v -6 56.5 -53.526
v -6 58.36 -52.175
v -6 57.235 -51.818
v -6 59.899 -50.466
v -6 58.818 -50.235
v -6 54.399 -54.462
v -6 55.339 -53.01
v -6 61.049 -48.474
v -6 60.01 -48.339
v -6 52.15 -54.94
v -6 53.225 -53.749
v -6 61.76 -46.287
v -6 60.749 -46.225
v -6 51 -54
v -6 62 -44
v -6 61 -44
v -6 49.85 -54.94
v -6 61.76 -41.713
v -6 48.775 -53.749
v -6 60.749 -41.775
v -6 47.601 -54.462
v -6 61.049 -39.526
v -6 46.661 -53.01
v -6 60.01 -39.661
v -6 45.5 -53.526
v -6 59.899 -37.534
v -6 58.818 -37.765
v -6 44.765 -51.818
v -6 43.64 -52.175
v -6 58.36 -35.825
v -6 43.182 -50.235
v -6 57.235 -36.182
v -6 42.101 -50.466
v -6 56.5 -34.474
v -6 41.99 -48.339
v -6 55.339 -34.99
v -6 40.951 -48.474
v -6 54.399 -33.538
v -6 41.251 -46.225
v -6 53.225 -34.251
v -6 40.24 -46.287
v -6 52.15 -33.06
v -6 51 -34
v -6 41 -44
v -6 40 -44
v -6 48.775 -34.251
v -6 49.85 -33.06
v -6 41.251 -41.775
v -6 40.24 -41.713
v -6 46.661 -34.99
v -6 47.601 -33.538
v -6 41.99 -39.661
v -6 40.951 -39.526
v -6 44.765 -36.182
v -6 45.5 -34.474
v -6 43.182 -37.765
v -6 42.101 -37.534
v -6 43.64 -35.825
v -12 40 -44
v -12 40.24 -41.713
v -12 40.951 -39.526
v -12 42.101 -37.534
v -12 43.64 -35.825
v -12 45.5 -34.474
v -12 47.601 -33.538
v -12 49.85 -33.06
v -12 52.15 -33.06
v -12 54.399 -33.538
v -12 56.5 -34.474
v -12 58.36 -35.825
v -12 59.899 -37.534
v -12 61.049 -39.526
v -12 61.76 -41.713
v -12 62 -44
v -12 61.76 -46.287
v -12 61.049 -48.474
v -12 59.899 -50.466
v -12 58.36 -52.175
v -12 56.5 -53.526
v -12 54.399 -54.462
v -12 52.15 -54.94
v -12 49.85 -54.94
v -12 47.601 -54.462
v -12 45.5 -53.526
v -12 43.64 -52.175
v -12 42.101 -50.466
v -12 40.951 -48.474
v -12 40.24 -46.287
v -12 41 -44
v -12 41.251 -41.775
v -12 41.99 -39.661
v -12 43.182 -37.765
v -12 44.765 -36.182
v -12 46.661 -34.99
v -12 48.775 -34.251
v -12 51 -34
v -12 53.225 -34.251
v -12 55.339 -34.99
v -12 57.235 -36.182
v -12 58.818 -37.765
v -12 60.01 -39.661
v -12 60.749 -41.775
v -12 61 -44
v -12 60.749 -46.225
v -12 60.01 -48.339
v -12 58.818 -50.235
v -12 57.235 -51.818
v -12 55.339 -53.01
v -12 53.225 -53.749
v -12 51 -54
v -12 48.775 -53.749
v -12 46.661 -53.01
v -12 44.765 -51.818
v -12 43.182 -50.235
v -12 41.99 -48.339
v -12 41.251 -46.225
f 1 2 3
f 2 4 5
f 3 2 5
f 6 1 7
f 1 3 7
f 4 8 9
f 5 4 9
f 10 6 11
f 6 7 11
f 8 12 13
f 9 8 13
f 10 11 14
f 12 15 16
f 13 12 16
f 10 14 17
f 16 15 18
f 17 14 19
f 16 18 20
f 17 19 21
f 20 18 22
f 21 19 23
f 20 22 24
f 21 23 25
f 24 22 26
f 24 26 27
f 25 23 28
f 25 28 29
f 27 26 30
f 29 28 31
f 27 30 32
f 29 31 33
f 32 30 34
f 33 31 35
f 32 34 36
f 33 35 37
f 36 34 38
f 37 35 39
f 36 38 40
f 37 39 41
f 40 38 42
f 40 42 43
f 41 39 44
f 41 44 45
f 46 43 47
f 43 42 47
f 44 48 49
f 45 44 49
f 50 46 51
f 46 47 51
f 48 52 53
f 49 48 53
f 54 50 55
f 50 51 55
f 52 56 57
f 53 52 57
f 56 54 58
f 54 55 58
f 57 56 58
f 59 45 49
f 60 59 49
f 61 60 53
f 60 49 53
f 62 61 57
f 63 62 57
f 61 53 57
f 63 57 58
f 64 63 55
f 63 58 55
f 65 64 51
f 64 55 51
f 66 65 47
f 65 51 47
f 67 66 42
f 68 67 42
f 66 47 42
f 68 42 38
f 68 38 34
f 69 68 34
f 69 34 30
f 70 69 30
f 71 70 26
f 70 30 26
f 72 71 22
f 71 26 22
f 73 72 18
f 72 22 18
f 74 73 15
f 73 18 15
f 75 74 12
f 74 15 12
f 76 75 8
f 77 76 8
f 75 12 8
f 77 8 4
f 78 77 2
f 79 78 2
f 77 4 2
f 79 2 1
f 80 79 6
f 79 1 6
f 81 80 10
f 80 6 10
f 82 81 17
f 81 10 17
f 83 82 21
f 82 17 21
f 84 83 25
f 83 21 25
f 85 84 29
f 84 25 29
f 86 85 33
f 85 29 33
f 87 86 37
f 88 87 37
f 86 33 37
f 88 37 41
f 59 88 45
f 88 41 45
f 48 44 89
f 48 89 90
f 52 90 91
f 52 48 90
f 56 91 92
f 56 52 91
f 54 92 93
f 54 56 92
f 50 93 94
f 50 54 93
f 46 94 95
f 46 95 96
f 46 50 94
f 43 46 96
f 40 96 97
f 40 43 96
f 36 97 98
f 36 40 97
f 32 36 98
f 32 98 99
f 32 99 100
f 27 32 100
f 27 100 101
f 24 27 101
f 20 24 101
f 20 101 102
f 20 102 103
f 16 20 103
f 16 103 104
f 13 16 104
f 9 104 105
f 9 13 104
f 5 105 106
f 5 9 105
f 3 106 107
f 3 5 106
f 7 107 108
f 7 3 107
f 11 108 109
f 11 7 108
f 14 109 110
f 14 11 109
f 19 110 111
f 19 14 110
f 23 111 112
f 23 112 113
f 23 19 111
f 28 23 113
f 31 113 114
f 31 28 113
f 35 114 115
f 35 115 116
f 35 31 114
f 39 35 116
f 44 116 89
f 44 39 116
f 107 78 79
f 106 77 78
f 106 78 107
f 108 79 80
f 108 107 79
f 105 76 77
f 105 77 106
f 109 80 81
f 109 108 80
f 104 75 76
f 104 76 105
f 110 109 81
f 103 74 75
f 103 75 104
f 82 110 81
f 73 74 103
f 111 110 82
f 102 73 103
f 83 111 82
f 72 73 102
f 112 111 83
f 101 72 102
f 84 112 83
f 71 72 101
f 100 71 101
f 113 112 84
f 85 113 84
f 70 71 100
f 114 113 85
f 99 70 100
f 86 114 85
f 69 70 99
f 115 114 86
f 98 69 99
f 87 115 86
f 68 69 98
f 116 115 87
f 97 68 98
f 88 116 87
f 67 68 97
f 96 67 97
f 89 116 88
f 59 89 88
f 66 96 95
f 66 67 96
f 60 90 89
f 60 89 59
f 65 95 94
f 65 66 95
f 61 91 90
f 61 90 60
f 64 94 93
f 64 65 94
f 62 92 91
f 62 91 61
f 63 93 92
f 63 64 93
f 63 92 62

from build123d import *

# Parameters (mm, degrees)
SKETCH035_R   = 11
SKETCH035_R_2 = 10
PAD013_DEPTH  = 6


with BuildPart() as bearing_outer_front_left:
    # Sketch035 → Pad013 (new body)
    with BuildSketch(Plane.YZ):
        Circle(SKETCH035_R)
        Circle(SKETCH035_R_2, mode=Mode.SUBTRACT)
    extrude(amount=PAD013_DEPTH)


with BuildPart() as bearing_outer_front_left_1:
    # Body007 placement: moved
    add(bearing_outer_front_left.part.moved(Location((6, -51, -44))))


with BuildPart() as bearing_outer_back_left:
    # Part__Mirroring003: instance of bearing-outer-front-left
    add(bearing_outer_front_left_1.part.mirror(Plane(origin=(9, -4e-06, -44.000004), x_dir=(1, 0, 0), z_dir=(0, 1, 0))))


with BuildPart() as bearing_outer_back_right:
    # Part__Mirroring004: instance of bearing-outer-back-left
    add(bearing_outer_back_left.part.mirror(Plane(origin=(-4e-06, 51, -44.000004), x_dir=(0, -1, 0), z_dir=(1, 0, 0))))


solid = bearing_outer_back_right.part
